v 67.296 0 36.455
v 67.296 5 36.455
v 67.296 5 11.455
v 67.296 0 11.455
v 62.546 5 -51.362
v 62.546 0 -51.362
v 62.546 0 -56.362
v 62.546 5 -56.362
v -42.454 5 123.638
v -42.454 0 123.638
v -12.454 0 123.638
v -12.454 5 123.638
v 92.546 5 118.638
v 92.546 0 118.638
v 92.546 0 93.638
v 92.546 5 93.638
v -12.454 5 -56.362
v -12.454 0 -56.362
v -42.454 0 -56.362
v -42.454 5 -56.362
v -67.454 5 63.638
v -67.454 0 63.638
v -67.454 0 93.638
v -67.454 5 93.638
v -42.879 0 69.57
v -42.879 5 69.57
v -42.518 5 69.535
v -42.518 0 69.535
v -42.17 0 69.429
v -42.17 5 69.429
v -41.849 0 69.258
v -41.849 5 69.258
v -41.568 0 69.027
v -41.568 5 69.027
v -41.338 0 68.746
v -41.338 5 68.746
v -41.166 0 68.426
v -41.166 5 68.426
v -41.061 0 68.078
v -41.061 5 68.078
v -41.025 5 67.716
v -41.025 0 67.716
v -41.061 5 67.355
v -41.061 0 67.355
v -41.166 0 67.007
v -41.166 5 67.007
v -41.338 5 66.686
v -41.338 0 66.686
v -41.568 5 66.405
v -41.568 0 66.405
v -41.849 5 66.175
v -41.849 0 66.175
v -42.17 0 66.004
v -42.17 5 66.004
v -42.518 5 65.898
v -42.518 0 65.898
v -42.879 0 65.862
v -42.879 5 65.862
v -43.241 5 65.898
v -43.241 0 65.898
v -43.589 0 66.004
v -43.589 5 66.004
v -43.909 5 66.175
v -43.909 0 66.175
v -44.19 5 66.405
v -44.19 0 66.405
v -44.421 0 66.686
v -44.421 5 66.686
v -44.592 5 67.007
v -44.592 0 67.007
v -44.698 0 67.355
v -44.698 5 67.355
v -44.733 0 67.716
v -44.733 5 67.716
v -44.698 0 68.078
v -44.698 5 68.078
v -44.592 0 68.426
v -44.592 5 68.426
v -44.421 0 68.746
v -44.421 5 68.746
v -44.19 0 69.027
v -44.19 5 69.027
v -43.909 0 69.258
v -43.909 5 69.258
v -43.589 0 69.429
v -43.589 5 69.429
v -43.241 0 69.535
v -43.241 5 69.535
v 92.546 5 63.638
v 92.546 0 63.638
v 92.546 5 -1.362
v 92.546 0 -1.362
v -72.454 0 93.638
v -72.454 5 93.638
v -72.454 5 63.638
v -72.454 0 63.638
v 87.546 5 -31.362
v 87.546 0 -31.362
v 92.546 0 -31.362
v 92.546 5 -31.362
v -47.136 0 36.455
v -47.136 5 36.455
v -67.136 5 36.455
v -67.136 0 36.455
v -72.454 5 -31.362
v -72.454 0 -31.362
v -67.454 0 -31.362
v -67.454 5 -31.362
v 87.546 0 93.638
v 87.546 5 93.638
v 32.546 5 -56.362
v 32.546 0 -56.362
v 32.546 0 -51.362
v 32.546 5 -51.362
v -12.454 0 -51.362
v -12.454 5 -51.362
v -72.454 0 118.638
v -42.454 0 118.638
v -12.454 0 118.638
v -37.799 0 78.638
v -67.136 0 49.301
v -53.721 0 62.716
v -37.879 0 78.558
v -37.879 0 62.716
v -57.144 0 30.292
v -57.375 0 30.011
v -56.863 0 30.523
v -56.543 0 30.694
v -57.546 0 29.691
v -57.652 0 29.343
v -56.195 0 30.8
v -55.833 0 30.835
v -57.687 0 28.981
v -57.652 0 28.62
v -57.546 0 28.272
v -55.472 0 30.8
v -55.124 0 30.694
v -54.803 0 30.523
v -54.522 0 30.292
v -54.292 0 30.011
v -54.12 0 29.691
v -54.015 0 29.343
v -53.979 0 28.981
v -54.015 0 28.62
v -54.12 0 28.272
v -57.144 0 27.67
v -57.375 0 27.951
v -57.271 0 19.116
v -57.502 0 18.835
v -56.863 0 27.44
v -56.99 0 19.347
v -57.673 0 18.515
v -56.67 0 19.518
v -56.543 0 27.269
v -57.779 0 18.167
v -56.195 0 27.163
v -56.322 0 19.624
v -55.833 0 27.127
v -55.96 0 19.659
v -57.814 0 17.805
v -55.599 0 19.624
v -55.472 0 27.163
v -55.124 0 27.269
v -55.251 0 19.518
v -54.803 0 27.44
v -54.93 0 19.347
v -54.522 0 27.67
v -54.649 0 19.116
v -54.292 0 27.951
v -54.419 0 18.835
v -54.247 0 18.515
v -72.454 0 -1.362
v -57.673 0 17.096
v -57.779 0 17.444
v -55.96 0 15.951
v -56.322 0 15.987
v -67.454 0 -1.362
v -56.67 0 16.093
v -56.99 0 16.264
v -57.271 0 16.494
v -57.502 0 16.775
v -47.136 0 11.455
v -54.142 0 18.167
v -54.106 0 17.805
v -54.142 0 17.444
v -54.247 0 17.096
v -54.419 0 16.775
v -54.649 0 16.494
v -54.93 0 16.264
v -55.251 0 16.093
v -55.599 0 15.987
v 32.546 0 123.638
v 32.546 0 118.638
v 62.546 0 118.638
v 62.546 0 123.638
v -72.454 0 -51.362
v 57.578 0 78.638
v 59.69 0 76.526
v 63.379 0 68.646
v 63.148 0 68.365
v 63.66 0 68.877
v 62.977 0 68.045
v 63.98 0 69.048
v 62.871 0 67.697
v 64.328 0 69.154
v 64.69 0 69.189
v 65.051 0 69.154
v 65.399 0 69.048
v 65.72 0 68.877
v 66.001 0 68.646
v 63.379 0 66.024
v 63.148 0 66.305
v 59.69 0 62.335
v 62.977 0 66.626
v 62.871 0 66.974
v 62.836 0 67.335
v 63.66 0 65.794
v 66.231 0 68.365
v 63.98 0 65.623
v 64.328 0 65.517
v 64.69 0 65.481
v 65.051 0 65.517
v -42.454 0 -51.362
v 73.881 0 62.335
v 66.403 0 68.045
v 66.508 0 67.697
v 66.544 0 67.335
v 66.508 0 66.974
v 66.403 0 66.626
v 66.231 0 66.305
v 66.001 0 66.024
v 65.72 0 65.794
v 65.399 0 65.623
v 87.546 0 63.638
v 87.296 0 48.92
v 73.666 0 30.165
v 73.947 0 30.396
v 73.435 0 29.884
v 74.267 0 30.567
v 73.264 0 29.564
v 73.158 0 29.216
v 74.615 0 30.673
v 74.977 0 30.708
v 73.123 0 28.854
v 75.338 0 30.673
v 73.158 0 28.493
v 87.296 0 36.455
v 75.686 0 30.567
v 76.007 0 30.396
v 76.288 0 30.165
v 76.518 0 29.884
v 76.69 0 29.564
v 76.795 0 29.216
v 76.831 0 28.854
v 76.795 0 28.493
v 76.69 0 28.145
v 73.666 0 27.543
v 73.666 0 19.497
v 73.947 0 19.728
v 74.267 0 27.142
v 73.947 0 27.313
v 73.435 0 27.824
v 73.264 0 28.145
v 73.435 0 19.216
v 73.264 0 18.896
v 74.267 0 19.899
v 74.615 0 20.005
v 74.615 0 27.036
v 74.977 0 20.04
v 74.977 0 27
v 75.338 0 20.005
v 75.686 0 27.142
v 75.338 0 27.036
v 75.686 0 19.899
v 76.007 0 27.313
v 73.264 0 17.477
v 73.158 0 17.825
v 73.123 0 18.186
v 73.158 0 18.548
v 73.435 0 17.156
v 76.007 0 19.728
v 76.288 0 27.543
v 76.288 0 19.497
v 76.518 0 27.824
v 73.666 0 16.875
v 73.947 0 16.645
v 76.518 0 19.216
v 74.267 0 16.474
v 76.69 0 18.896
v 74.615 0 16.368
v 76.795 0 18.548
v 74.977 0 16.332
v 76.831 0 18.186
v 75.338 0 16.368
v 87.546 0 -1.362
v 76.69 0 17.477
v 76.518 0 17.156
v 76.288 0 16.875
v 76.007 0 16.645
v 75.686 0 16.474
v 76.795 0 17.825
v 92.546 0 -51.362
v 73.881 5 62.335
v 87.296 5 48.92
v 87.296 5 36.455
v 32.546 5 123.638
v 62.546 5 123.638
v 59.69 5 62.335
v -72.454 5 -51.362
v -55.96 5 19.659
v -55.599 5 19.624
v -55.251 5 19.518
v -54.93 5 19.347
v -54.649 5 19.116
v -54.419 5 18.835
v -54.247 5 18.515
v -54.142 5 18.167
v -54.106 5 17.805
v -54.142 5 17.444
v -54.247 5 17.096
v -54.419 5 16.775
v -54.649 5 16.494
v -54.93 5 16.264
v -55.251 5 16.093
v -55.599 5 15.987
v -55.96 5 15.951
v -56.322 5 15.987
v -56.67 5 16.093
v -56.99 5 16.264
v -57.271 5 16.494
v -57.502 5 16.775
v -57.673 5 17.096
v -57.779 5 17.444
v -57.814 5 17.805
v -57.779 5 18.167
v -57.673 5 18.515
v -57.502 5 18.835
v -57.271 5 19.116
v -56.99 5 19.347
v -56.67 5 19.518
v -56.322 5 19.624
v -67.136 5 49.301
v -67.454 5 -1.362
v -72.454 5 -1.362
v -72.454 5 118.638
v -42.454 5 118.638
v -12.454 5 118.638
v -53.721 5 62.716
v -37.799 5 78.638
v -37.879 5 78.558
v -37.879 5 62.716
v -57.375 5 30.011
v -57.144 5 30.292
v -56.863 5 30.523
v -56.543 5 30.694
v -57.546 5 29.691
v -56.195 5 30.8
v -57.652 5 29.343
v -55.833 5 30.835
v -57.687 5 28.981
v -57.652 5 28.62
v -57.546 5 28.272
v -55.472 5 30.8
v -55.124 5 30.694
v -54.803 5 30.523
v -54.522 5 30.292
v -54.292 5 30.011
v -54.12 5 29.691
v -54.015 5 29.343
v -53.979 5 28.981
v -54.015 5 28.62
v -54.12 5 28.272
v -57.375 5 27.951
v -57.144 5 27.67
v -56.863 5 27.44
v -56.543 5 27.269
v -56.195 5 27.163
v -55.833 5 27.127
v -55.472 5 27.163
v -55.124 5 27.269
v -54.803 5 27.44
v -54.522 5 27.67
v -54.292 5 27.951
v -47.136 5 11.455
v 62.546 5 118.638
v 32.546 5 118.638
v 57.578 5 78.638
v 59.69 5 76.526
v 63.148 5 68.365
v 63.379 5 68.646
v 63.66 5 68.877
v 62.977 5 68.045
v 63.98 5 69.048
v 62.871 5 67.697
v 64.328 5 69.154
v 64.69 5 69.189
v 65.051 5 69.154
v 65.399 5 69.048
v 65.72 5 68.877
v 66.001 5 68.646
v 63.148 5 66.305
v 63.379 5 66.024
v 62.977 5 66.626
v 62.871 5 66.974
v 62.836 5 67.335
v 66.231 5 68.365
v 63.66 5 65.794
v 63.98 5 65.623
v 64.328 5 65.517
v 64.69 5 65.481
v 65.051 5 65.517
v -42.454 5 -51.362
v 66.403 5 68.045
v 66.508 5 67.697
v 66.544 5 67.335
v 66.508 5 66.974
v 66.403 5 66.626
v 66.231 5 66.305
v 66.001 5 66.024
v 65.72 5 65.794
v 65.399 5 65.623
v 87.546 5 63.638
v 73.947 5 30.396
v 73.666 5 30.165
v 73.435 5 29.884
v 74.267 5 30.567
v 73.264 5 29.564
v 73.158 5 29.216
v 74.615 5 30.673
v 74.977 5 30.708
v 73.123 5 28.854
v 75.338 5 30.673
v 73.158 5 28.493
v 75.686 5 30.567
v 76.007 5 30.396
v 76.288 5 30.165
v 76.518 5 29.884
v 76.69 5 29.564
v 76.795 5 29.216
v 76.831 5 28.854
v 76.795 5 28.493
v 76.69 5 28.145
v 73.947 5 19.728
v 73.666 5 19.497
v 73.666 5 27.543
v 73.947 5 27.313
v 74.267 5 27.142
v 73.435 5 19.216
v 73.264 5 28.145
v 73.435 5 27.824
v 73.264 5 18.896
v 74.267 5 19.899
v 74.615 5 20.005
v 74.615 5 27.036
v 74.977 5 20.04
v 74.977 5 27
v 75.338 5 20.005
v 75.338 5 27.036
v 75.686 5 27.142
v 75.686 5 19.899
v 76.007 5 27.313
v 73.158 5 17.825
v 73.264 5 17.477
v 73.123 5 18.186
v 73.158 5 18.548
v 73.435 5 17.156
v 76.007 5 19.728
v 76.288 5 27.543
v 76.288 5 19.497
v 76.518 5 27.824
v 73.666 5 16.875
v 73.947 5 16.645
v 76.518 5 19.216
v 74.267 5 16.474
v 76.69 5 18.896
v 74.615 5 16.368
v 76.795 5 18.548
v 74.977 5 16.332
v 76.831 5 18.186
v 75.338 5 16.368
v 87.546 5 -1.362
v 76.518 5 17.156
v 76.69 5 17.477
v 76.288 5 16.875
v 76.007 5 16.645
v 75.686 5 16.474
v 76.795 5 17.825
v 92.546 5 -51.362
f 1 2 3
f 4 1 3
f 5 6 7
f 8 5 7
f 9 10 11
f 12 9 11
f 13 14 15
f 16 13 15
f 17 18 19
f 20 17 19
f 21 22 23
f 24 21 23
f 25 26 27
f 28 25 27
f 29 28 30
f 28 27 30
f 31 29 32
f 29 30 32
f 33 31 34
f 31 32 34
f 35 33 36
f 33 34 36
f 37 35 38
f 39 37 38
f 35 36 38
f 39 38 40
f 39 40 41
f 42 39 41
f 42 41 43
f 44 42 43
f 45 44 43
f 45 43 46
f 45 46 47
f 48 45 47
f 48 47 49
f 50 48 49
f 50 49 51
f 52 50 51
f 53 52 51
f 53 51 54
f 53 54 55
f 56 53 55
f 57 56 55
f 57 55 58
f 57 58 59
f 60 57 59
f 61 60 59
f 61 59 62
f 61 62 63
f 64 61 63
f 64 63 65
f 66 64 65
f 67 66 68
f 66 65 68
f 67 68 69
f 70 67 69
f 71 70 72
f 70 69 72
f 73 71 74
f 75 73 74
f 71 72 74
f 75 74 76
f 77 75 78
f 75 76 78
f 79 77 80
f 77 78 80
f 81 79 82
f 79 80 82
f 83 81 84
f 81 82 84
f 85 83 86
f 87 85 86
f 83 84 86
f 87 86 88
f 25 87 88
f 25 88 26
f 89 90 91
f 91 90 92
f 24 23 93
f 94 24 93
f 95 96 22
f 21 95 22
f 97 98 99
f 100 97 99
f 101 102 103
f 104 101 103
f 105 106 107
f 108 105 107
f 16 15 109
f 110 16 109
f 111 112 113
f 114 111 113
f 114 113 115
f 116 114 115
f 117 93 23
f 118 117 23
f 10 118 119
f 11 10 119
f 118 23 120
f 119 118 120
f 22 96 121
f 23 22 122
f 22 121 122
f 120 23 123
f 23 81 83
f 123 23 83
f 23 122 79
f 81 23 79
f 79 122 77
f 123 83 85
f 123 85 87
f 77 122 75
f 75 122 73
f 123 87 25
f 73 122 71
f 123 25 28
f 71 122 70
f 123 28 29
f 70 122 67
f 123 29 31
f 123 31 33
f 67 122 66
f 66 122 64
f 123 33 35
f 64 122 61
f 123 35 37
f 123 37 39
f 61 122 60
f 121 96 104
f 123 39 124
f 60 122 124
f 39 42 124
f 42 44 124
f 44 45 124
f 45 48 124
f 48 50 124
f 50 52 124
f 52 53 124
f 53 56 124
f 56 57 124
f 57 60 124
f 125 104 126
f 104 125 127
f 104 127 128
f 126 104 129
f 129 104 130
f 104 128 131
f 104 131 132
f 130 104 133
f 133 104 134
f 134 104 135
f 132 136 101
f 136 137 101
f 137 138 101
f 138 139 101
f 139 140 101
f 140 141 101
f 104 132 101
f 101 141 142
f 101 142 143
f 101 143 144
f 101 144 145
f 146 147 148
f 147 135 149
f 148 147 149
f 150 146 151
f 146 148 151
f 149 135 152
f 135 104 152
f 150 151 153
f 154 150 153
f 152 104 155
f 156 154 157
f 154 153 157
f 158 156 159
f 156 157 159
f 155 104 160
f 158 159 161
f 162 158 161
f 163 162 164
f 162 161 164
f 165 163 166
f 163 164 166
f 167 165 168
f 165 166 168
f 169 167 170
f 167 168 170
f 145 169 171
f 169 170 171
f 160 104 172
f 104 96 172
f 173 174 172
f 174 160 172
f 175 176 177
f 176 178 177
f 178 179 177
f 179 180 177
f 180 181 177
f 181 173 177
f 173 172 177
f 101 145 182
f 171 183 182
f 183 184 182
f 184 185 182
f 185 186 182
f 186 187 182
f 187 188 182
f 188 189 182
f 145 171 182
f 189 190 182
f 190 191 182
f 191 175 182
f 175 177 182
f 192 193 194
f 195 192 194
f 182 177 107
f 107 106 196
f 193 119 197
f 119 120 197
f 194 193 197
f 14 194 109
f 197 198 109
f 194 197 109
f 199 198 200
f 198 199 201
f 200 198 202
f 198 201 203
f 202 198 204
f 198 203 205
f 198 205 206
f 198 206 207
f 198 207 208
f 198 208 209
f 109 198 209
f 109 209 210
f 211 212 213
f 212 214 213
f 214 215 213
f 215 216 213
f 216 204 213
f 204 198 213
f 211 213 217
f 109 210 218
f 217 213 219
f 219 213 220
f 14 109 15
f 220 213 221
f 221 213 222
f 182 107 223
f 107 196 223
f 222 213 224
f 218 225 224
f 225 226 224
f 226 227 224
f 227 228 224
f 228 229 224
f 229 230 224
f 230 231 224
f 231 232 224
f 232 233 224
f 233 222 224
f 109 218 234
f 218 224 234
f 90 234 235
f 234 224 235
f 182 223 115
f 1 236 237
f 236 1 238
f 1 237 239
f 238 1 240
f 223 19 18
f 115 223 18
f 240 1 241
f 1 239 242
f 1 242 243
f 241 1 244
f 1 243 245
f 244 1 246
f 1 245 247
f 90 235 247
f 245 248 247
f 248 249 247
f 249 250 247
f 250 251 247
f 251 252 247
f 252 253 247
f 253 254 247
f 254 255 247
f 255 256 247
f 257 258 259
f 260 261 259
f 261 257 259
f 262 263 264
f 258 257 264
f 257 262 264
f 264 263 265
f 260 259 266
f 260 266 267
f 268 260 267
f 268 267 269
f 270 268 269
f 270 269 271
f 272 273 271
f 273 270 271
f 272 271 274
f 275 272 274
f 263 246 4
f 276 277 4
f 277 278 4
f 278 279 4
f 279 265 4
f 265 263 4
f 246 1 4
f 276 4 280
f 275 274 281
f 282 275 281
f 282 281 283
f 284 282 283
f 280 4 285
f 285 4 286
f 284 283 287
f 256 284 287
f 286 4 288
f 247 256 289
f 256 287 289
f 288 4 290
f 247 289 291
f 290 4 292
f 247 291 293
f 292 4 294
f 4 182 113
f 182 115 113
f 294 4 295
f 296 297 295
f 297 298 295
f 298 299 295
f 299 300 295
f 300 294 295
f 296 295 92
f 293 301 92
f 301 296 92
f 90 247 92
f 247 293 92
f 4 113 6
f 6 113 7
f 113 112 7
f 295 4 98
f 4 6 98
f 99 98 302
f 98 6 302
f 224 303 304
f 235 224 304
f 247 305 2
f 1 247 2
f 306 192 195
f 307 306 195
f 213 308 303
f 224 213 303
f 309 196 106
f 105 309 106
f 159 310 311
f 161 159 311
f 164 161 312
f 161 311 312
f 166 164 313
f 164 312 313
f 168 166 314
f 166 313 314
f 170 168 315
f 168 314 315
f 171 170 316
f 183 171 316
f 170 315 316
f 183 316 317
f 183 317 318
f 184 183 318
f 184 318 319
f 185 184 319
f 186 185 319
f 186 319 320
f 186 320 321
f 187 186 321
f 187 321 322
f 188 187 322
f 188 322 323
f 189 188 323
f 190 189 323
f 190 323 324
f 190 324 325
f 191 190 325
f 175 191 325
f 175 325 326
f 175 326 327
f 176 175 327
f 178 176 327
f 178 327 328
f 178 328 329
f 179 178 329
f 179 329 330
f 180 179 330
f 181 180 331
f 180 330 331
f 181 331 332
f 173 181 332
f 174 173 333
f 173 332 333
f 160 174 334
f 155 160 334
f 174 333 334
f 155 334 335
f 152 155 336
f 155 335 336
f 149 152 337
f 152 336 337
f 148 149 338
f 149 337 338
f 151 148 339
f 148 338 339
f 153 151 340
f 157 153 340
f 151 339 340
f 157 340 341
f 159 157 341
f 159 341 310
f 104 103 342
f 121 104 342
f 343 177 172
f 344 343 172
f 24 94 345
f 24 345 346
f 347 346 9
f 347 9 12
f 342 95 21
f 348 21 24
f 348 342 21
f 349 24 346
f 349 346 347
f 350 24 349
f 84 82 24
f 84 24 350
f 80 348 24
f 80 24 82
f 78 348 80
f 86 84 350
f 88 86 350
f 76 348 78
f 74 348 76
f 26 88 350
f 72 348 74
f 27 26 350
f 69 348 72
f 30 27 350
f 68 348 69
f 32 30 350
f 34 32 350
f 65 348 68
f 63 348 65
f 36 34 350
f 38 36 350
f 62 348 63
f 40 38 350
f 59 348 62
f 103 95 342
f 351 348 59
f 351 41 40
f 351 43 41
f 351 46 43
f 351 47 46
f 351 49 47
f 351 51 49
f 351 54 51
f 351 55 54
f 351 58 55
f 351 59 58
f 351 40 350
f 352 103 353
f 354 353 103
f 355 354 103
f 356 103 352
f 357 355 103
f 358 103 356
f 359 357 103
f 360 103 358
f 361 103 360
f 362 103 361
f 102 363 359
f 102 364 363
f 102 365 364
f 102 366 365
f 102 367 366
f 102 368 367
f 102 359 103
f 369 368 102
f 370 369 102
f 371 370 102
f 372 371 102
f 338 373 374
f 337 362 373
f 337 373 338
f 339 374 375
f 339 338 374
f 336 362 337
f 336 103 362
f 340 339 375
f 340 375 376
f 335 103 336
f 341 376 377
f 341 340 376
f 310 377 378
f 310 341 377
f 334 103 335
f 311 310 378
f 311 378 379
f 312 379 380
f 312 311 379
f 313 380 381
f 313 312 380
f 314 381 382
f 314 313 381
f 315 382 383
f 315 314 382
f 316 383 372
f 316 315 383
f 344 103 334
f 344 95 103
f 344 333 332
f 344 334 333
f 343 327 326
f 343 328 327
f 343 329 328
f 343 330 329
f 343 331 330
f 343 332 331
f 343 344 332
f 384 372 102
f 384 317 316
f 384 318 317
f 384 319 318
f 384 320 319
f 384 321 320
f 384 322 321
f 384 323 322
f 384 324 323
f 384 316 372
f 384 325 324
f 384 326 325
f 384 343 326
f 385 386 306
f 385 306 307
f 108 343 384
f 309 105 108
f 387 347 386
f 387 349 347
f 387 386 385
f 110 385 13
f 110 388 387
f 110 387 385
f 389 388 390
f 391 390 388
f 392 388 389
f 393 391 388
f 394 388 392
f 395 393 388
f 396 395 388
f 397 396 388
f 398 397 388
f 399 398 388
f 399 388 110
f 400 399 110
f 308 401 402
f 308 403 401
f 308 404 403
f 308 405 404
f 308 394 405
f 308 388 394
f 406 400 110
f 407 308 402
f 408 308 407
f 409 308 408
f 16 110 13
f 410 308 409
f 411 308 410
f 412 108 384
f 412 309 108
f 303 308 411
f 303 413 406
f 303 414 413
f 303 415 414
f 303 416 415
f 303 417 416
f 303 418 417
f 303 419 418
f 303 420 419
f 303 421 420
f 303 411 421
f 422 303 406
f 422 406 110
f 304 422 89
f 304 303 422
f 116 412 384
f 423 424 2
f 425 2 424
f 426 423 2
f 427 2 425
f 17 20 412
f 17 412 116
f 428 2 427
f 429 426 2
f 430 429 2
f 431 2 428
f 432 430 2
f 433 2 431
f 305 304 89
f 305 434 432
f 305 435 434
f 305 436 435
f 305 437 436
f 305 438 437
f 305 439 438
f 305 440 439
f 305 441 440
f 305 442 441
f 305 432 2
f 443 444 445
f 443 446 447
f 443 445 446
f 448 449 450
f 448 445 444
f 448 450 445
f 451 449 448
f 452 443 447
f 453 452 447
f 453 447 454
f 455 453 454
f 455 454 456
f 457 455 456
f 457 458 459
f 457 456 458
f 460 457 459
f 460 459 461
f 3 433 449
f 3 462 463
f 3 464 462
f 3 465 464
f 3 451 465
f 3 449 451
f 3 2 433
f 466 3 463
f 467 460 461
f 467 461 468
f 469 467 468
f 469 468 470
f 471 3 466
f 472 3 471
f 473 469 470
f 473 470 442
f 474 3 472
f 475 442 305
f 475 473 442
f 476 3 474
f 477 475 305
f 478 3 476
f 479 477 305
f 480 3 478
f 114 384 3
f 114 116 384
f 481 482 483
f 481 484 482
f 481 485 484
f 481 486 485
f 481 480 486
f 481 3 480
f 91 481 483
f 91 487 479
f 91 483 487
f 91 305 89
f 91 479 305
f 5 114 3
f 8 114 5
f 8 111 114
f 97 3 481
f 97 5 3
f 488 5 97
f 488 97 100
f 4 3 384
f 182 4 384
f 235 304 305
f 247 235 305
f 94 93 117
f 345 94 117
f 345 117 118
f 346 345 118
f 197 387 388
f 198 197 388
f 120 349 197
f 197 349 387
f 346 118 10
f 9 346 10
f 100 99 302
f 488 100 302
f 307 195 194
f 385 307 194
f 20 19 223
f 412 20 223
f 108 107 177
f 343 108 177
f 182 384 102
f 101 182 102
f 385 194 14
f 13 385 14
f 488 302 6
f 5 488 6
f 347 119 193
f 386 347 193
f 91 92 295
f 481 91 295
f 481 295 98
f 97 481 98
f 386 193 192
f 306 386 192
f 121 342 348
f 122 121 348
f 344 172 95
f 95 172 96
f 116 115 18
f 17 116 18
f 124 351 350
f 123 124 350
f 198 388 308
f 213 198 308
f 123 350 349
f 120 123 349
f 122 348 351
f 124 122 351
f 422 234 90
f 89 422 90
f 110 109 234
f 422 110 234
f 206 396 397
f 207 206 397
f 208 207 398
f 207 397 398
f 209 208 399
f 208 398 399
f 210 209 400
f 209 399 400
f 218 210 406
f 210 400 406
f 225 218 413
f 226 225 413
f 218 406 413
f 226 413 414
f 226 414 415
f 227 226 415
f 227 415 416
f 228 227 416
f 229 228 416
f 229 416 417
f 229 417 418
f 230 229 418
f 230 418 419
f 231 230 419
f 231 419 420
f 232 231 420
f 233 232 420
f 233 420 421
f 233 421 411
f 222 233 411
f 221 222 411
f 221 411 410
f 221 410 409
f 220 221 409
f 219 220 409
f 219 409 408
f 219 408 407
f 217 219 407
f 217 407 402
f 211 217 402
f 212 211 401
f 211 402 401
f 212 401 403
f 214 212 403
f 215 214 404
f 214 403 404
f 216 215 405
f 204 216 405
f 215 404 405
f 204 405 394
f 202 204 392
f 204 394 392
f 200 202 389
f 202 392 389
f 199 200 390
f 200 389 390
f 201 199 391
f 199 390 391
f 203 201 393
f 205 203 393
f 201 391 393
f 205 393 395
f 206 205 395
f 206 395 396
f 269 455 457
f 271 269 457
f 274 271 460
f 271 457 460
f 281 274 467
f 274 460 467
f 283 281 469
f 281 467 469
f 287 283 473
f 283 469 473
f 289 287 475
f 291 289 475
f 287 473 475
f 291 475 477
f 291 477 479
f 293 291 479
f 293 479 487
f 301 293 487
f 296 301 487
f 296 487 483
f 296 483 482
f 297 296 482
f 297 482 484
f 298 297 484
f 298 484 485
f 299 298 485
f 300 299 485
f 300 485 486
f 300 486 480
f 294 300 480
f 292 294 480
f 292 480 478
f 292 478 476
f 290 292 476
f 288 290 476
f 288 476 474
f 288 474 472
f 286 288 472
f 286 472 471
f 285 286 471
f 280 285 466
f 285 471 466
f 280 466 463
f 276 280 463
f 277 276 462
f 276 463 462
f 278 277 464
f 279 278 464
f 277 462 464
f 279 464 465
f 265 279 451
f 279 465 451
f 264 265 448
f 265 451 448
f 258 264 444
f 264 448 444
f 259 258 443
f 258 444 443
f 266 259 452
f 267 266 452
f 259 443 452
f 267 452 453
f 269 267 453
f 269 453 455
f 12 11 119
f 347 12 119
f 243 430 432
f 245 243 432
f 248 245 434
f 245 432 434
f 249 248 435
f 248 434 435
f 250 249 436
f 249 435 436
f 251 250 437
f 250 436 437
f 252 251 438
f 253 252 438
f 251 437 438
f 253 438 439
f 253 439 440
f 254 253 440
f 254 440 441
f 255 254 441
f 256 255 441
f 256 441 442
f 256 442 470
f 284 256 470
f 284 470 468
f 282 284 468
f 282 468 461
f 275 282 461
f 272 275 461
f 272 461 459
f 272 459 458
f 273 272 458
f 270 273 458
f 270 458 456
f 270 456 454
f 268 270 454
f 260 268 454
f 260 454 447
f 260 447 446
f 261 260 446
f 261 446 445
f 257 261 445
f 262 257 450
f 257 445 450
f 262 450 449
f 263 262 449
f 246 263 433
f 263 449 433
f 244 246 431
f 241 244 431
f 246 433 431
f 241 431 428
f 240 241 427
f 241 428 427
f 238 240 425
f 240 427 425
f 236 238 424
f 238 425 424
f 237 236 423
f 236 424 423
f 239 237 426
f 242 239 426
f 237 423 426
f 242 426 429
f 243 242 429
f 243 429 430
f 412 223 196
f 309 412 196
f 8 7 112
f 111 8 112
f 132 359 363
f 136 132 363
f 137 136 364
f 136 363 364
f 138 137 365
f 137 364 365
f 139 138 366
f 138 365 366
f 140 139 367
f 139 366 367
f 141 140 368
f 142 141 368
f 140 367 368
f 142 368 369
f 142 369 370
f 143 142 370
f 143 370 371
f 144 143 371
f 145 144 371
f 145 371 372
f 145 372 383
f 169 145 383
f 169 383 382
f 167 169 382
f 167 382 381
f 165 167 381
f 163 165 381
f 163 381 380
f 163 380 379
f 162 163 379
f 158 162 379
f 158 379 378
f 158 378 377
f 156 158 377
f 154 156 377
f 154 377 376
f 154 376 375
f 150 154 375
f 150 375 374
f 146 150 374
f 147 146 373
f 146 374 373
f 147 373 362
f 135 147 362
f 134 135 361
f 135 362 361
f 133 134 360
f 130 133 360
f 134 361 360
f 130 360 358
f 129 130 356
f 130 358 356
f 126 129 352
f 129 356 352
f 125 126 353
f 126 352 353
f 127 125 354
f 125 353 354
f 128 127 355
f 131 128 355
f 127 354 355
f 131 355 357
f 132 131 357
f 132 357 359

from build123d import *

# Parameters (mm, degrees)
BOSS_EXTRUDE1_DEPTH = 5
SKETCH3_R           = 1.85399934
CUT_EXTRUDE1_DEPTH  = 10


with BuildPart() as part:
    # Sketch1 → Boss-Extrude1 (new body)
    with BuildSketch(Plane(origin=(0, 0, 0), x_dir=(1, 0, 0), z_dir=(0, 1, 0))):
        Polygon((-42.454197946, 56.361544115), (-42.454197946, 51.361544115), (-72.454197946, 51.361544115), (-72.454197946, 31.361544115), (-67.454197946, 31.361544115), (-67.454197946, 1.361544115), (-72.454197946, 1.361544115), (-72.454197946, -63.638455885), (-67.454197946, -63.638455885), (-67.454197946, -93.638455885), (-72.454197946, -93.638455885), (-72.454197946, -118.638455885), (-42.454197946, -118.638455885), (-42.454197946, -123.638455885), (-12.454197946, -123.638455885), (-12.454197946, -118.638455885), (32.545802054, -118.638455885), (32.545802054, -123.638455885), (62.545802054, -123.638455885), (62.545802054, -118.638455885), (92.545802054, -118.638455885), (92.545802054, -93.638455885), (87.545802054, -93.638455885), (87.545802054, -63.638455885), (92.545802054, -63.638455885), (92.545802054, 1.361544115), (87.545802054, 1.361544115), (87.545802054, 31.361544115), (92.545802054, 31.361544115), (92.545802054, 51.361544115), (62.545802054, 51.361544115), (62.545802054, 56.361544115), (32.545802054, 56.361544115), (32.545802054, 51.361544115), (-12.454197946, 51.361544115), (-12.454197946, 56.361544115), align=None)
    extrude(amount=BOSS_EXTRUDE1_DEPTH)

    # Sketch3 → Cut-Extrude1 (cut)
    with BuildSketch(Plane(origin=(0, 5, 0), x_dir=(1, 0, 0), z_dir=(0, 1, 0))):
        Polygon((87.295802054, -48.920455885), (87.295802054, -36.455455885), (67.295802054, -36.455455885), (67.295802054, -11.455455885), (-47.136197946, -11.455455885), (-47.136197946, -36.455455885), (-67.136197946, -36.455455885), (-67.136197946, -49.301455885), (-53.721197946, -62.716455885), (-37.879197946, -62.716455885), (-37.879197946, -78.558455885), (-37.799197946, -78.638455885), (57.577802054, -78.638455885), (59.689802054, -76.526455885), (59.689802054, -62.335455885), (73.880802054, -62.335455885), align=None)
        with Locations(Location((-42.879197946, -67.716455885, 0), (0, 0, 270))):
            Circle(SKETCH3_R)
        with Locations(Location((-55.960197946, -17.805455885, 0), (0, 0, 270))):
            Circle(SKETCH3_R)
        with Locations(Location((-55.833197946, -28.981455885, 0), (0, 0, 270))):
            Circle(SKETCH3_R)
        with Locations(Location((64.689802054, -67.335455885, 0), (0, 0, 270))):
            Circle(SKETCH3_R)
        with Locations(Location((74.976802054, -18.186455885, 0), (0, 0, 270))):
            Circle(SKETCH3_R)
        with Locations(Location((74.976802054, -28.854455885, 0), (0, 0, 270))):
            Circle(SKETCH3_R)
    extrude(amount=-CUT_EXTRUDE1_DEPTH, mode=Mode.SUBTRACT)


solid = part.part
